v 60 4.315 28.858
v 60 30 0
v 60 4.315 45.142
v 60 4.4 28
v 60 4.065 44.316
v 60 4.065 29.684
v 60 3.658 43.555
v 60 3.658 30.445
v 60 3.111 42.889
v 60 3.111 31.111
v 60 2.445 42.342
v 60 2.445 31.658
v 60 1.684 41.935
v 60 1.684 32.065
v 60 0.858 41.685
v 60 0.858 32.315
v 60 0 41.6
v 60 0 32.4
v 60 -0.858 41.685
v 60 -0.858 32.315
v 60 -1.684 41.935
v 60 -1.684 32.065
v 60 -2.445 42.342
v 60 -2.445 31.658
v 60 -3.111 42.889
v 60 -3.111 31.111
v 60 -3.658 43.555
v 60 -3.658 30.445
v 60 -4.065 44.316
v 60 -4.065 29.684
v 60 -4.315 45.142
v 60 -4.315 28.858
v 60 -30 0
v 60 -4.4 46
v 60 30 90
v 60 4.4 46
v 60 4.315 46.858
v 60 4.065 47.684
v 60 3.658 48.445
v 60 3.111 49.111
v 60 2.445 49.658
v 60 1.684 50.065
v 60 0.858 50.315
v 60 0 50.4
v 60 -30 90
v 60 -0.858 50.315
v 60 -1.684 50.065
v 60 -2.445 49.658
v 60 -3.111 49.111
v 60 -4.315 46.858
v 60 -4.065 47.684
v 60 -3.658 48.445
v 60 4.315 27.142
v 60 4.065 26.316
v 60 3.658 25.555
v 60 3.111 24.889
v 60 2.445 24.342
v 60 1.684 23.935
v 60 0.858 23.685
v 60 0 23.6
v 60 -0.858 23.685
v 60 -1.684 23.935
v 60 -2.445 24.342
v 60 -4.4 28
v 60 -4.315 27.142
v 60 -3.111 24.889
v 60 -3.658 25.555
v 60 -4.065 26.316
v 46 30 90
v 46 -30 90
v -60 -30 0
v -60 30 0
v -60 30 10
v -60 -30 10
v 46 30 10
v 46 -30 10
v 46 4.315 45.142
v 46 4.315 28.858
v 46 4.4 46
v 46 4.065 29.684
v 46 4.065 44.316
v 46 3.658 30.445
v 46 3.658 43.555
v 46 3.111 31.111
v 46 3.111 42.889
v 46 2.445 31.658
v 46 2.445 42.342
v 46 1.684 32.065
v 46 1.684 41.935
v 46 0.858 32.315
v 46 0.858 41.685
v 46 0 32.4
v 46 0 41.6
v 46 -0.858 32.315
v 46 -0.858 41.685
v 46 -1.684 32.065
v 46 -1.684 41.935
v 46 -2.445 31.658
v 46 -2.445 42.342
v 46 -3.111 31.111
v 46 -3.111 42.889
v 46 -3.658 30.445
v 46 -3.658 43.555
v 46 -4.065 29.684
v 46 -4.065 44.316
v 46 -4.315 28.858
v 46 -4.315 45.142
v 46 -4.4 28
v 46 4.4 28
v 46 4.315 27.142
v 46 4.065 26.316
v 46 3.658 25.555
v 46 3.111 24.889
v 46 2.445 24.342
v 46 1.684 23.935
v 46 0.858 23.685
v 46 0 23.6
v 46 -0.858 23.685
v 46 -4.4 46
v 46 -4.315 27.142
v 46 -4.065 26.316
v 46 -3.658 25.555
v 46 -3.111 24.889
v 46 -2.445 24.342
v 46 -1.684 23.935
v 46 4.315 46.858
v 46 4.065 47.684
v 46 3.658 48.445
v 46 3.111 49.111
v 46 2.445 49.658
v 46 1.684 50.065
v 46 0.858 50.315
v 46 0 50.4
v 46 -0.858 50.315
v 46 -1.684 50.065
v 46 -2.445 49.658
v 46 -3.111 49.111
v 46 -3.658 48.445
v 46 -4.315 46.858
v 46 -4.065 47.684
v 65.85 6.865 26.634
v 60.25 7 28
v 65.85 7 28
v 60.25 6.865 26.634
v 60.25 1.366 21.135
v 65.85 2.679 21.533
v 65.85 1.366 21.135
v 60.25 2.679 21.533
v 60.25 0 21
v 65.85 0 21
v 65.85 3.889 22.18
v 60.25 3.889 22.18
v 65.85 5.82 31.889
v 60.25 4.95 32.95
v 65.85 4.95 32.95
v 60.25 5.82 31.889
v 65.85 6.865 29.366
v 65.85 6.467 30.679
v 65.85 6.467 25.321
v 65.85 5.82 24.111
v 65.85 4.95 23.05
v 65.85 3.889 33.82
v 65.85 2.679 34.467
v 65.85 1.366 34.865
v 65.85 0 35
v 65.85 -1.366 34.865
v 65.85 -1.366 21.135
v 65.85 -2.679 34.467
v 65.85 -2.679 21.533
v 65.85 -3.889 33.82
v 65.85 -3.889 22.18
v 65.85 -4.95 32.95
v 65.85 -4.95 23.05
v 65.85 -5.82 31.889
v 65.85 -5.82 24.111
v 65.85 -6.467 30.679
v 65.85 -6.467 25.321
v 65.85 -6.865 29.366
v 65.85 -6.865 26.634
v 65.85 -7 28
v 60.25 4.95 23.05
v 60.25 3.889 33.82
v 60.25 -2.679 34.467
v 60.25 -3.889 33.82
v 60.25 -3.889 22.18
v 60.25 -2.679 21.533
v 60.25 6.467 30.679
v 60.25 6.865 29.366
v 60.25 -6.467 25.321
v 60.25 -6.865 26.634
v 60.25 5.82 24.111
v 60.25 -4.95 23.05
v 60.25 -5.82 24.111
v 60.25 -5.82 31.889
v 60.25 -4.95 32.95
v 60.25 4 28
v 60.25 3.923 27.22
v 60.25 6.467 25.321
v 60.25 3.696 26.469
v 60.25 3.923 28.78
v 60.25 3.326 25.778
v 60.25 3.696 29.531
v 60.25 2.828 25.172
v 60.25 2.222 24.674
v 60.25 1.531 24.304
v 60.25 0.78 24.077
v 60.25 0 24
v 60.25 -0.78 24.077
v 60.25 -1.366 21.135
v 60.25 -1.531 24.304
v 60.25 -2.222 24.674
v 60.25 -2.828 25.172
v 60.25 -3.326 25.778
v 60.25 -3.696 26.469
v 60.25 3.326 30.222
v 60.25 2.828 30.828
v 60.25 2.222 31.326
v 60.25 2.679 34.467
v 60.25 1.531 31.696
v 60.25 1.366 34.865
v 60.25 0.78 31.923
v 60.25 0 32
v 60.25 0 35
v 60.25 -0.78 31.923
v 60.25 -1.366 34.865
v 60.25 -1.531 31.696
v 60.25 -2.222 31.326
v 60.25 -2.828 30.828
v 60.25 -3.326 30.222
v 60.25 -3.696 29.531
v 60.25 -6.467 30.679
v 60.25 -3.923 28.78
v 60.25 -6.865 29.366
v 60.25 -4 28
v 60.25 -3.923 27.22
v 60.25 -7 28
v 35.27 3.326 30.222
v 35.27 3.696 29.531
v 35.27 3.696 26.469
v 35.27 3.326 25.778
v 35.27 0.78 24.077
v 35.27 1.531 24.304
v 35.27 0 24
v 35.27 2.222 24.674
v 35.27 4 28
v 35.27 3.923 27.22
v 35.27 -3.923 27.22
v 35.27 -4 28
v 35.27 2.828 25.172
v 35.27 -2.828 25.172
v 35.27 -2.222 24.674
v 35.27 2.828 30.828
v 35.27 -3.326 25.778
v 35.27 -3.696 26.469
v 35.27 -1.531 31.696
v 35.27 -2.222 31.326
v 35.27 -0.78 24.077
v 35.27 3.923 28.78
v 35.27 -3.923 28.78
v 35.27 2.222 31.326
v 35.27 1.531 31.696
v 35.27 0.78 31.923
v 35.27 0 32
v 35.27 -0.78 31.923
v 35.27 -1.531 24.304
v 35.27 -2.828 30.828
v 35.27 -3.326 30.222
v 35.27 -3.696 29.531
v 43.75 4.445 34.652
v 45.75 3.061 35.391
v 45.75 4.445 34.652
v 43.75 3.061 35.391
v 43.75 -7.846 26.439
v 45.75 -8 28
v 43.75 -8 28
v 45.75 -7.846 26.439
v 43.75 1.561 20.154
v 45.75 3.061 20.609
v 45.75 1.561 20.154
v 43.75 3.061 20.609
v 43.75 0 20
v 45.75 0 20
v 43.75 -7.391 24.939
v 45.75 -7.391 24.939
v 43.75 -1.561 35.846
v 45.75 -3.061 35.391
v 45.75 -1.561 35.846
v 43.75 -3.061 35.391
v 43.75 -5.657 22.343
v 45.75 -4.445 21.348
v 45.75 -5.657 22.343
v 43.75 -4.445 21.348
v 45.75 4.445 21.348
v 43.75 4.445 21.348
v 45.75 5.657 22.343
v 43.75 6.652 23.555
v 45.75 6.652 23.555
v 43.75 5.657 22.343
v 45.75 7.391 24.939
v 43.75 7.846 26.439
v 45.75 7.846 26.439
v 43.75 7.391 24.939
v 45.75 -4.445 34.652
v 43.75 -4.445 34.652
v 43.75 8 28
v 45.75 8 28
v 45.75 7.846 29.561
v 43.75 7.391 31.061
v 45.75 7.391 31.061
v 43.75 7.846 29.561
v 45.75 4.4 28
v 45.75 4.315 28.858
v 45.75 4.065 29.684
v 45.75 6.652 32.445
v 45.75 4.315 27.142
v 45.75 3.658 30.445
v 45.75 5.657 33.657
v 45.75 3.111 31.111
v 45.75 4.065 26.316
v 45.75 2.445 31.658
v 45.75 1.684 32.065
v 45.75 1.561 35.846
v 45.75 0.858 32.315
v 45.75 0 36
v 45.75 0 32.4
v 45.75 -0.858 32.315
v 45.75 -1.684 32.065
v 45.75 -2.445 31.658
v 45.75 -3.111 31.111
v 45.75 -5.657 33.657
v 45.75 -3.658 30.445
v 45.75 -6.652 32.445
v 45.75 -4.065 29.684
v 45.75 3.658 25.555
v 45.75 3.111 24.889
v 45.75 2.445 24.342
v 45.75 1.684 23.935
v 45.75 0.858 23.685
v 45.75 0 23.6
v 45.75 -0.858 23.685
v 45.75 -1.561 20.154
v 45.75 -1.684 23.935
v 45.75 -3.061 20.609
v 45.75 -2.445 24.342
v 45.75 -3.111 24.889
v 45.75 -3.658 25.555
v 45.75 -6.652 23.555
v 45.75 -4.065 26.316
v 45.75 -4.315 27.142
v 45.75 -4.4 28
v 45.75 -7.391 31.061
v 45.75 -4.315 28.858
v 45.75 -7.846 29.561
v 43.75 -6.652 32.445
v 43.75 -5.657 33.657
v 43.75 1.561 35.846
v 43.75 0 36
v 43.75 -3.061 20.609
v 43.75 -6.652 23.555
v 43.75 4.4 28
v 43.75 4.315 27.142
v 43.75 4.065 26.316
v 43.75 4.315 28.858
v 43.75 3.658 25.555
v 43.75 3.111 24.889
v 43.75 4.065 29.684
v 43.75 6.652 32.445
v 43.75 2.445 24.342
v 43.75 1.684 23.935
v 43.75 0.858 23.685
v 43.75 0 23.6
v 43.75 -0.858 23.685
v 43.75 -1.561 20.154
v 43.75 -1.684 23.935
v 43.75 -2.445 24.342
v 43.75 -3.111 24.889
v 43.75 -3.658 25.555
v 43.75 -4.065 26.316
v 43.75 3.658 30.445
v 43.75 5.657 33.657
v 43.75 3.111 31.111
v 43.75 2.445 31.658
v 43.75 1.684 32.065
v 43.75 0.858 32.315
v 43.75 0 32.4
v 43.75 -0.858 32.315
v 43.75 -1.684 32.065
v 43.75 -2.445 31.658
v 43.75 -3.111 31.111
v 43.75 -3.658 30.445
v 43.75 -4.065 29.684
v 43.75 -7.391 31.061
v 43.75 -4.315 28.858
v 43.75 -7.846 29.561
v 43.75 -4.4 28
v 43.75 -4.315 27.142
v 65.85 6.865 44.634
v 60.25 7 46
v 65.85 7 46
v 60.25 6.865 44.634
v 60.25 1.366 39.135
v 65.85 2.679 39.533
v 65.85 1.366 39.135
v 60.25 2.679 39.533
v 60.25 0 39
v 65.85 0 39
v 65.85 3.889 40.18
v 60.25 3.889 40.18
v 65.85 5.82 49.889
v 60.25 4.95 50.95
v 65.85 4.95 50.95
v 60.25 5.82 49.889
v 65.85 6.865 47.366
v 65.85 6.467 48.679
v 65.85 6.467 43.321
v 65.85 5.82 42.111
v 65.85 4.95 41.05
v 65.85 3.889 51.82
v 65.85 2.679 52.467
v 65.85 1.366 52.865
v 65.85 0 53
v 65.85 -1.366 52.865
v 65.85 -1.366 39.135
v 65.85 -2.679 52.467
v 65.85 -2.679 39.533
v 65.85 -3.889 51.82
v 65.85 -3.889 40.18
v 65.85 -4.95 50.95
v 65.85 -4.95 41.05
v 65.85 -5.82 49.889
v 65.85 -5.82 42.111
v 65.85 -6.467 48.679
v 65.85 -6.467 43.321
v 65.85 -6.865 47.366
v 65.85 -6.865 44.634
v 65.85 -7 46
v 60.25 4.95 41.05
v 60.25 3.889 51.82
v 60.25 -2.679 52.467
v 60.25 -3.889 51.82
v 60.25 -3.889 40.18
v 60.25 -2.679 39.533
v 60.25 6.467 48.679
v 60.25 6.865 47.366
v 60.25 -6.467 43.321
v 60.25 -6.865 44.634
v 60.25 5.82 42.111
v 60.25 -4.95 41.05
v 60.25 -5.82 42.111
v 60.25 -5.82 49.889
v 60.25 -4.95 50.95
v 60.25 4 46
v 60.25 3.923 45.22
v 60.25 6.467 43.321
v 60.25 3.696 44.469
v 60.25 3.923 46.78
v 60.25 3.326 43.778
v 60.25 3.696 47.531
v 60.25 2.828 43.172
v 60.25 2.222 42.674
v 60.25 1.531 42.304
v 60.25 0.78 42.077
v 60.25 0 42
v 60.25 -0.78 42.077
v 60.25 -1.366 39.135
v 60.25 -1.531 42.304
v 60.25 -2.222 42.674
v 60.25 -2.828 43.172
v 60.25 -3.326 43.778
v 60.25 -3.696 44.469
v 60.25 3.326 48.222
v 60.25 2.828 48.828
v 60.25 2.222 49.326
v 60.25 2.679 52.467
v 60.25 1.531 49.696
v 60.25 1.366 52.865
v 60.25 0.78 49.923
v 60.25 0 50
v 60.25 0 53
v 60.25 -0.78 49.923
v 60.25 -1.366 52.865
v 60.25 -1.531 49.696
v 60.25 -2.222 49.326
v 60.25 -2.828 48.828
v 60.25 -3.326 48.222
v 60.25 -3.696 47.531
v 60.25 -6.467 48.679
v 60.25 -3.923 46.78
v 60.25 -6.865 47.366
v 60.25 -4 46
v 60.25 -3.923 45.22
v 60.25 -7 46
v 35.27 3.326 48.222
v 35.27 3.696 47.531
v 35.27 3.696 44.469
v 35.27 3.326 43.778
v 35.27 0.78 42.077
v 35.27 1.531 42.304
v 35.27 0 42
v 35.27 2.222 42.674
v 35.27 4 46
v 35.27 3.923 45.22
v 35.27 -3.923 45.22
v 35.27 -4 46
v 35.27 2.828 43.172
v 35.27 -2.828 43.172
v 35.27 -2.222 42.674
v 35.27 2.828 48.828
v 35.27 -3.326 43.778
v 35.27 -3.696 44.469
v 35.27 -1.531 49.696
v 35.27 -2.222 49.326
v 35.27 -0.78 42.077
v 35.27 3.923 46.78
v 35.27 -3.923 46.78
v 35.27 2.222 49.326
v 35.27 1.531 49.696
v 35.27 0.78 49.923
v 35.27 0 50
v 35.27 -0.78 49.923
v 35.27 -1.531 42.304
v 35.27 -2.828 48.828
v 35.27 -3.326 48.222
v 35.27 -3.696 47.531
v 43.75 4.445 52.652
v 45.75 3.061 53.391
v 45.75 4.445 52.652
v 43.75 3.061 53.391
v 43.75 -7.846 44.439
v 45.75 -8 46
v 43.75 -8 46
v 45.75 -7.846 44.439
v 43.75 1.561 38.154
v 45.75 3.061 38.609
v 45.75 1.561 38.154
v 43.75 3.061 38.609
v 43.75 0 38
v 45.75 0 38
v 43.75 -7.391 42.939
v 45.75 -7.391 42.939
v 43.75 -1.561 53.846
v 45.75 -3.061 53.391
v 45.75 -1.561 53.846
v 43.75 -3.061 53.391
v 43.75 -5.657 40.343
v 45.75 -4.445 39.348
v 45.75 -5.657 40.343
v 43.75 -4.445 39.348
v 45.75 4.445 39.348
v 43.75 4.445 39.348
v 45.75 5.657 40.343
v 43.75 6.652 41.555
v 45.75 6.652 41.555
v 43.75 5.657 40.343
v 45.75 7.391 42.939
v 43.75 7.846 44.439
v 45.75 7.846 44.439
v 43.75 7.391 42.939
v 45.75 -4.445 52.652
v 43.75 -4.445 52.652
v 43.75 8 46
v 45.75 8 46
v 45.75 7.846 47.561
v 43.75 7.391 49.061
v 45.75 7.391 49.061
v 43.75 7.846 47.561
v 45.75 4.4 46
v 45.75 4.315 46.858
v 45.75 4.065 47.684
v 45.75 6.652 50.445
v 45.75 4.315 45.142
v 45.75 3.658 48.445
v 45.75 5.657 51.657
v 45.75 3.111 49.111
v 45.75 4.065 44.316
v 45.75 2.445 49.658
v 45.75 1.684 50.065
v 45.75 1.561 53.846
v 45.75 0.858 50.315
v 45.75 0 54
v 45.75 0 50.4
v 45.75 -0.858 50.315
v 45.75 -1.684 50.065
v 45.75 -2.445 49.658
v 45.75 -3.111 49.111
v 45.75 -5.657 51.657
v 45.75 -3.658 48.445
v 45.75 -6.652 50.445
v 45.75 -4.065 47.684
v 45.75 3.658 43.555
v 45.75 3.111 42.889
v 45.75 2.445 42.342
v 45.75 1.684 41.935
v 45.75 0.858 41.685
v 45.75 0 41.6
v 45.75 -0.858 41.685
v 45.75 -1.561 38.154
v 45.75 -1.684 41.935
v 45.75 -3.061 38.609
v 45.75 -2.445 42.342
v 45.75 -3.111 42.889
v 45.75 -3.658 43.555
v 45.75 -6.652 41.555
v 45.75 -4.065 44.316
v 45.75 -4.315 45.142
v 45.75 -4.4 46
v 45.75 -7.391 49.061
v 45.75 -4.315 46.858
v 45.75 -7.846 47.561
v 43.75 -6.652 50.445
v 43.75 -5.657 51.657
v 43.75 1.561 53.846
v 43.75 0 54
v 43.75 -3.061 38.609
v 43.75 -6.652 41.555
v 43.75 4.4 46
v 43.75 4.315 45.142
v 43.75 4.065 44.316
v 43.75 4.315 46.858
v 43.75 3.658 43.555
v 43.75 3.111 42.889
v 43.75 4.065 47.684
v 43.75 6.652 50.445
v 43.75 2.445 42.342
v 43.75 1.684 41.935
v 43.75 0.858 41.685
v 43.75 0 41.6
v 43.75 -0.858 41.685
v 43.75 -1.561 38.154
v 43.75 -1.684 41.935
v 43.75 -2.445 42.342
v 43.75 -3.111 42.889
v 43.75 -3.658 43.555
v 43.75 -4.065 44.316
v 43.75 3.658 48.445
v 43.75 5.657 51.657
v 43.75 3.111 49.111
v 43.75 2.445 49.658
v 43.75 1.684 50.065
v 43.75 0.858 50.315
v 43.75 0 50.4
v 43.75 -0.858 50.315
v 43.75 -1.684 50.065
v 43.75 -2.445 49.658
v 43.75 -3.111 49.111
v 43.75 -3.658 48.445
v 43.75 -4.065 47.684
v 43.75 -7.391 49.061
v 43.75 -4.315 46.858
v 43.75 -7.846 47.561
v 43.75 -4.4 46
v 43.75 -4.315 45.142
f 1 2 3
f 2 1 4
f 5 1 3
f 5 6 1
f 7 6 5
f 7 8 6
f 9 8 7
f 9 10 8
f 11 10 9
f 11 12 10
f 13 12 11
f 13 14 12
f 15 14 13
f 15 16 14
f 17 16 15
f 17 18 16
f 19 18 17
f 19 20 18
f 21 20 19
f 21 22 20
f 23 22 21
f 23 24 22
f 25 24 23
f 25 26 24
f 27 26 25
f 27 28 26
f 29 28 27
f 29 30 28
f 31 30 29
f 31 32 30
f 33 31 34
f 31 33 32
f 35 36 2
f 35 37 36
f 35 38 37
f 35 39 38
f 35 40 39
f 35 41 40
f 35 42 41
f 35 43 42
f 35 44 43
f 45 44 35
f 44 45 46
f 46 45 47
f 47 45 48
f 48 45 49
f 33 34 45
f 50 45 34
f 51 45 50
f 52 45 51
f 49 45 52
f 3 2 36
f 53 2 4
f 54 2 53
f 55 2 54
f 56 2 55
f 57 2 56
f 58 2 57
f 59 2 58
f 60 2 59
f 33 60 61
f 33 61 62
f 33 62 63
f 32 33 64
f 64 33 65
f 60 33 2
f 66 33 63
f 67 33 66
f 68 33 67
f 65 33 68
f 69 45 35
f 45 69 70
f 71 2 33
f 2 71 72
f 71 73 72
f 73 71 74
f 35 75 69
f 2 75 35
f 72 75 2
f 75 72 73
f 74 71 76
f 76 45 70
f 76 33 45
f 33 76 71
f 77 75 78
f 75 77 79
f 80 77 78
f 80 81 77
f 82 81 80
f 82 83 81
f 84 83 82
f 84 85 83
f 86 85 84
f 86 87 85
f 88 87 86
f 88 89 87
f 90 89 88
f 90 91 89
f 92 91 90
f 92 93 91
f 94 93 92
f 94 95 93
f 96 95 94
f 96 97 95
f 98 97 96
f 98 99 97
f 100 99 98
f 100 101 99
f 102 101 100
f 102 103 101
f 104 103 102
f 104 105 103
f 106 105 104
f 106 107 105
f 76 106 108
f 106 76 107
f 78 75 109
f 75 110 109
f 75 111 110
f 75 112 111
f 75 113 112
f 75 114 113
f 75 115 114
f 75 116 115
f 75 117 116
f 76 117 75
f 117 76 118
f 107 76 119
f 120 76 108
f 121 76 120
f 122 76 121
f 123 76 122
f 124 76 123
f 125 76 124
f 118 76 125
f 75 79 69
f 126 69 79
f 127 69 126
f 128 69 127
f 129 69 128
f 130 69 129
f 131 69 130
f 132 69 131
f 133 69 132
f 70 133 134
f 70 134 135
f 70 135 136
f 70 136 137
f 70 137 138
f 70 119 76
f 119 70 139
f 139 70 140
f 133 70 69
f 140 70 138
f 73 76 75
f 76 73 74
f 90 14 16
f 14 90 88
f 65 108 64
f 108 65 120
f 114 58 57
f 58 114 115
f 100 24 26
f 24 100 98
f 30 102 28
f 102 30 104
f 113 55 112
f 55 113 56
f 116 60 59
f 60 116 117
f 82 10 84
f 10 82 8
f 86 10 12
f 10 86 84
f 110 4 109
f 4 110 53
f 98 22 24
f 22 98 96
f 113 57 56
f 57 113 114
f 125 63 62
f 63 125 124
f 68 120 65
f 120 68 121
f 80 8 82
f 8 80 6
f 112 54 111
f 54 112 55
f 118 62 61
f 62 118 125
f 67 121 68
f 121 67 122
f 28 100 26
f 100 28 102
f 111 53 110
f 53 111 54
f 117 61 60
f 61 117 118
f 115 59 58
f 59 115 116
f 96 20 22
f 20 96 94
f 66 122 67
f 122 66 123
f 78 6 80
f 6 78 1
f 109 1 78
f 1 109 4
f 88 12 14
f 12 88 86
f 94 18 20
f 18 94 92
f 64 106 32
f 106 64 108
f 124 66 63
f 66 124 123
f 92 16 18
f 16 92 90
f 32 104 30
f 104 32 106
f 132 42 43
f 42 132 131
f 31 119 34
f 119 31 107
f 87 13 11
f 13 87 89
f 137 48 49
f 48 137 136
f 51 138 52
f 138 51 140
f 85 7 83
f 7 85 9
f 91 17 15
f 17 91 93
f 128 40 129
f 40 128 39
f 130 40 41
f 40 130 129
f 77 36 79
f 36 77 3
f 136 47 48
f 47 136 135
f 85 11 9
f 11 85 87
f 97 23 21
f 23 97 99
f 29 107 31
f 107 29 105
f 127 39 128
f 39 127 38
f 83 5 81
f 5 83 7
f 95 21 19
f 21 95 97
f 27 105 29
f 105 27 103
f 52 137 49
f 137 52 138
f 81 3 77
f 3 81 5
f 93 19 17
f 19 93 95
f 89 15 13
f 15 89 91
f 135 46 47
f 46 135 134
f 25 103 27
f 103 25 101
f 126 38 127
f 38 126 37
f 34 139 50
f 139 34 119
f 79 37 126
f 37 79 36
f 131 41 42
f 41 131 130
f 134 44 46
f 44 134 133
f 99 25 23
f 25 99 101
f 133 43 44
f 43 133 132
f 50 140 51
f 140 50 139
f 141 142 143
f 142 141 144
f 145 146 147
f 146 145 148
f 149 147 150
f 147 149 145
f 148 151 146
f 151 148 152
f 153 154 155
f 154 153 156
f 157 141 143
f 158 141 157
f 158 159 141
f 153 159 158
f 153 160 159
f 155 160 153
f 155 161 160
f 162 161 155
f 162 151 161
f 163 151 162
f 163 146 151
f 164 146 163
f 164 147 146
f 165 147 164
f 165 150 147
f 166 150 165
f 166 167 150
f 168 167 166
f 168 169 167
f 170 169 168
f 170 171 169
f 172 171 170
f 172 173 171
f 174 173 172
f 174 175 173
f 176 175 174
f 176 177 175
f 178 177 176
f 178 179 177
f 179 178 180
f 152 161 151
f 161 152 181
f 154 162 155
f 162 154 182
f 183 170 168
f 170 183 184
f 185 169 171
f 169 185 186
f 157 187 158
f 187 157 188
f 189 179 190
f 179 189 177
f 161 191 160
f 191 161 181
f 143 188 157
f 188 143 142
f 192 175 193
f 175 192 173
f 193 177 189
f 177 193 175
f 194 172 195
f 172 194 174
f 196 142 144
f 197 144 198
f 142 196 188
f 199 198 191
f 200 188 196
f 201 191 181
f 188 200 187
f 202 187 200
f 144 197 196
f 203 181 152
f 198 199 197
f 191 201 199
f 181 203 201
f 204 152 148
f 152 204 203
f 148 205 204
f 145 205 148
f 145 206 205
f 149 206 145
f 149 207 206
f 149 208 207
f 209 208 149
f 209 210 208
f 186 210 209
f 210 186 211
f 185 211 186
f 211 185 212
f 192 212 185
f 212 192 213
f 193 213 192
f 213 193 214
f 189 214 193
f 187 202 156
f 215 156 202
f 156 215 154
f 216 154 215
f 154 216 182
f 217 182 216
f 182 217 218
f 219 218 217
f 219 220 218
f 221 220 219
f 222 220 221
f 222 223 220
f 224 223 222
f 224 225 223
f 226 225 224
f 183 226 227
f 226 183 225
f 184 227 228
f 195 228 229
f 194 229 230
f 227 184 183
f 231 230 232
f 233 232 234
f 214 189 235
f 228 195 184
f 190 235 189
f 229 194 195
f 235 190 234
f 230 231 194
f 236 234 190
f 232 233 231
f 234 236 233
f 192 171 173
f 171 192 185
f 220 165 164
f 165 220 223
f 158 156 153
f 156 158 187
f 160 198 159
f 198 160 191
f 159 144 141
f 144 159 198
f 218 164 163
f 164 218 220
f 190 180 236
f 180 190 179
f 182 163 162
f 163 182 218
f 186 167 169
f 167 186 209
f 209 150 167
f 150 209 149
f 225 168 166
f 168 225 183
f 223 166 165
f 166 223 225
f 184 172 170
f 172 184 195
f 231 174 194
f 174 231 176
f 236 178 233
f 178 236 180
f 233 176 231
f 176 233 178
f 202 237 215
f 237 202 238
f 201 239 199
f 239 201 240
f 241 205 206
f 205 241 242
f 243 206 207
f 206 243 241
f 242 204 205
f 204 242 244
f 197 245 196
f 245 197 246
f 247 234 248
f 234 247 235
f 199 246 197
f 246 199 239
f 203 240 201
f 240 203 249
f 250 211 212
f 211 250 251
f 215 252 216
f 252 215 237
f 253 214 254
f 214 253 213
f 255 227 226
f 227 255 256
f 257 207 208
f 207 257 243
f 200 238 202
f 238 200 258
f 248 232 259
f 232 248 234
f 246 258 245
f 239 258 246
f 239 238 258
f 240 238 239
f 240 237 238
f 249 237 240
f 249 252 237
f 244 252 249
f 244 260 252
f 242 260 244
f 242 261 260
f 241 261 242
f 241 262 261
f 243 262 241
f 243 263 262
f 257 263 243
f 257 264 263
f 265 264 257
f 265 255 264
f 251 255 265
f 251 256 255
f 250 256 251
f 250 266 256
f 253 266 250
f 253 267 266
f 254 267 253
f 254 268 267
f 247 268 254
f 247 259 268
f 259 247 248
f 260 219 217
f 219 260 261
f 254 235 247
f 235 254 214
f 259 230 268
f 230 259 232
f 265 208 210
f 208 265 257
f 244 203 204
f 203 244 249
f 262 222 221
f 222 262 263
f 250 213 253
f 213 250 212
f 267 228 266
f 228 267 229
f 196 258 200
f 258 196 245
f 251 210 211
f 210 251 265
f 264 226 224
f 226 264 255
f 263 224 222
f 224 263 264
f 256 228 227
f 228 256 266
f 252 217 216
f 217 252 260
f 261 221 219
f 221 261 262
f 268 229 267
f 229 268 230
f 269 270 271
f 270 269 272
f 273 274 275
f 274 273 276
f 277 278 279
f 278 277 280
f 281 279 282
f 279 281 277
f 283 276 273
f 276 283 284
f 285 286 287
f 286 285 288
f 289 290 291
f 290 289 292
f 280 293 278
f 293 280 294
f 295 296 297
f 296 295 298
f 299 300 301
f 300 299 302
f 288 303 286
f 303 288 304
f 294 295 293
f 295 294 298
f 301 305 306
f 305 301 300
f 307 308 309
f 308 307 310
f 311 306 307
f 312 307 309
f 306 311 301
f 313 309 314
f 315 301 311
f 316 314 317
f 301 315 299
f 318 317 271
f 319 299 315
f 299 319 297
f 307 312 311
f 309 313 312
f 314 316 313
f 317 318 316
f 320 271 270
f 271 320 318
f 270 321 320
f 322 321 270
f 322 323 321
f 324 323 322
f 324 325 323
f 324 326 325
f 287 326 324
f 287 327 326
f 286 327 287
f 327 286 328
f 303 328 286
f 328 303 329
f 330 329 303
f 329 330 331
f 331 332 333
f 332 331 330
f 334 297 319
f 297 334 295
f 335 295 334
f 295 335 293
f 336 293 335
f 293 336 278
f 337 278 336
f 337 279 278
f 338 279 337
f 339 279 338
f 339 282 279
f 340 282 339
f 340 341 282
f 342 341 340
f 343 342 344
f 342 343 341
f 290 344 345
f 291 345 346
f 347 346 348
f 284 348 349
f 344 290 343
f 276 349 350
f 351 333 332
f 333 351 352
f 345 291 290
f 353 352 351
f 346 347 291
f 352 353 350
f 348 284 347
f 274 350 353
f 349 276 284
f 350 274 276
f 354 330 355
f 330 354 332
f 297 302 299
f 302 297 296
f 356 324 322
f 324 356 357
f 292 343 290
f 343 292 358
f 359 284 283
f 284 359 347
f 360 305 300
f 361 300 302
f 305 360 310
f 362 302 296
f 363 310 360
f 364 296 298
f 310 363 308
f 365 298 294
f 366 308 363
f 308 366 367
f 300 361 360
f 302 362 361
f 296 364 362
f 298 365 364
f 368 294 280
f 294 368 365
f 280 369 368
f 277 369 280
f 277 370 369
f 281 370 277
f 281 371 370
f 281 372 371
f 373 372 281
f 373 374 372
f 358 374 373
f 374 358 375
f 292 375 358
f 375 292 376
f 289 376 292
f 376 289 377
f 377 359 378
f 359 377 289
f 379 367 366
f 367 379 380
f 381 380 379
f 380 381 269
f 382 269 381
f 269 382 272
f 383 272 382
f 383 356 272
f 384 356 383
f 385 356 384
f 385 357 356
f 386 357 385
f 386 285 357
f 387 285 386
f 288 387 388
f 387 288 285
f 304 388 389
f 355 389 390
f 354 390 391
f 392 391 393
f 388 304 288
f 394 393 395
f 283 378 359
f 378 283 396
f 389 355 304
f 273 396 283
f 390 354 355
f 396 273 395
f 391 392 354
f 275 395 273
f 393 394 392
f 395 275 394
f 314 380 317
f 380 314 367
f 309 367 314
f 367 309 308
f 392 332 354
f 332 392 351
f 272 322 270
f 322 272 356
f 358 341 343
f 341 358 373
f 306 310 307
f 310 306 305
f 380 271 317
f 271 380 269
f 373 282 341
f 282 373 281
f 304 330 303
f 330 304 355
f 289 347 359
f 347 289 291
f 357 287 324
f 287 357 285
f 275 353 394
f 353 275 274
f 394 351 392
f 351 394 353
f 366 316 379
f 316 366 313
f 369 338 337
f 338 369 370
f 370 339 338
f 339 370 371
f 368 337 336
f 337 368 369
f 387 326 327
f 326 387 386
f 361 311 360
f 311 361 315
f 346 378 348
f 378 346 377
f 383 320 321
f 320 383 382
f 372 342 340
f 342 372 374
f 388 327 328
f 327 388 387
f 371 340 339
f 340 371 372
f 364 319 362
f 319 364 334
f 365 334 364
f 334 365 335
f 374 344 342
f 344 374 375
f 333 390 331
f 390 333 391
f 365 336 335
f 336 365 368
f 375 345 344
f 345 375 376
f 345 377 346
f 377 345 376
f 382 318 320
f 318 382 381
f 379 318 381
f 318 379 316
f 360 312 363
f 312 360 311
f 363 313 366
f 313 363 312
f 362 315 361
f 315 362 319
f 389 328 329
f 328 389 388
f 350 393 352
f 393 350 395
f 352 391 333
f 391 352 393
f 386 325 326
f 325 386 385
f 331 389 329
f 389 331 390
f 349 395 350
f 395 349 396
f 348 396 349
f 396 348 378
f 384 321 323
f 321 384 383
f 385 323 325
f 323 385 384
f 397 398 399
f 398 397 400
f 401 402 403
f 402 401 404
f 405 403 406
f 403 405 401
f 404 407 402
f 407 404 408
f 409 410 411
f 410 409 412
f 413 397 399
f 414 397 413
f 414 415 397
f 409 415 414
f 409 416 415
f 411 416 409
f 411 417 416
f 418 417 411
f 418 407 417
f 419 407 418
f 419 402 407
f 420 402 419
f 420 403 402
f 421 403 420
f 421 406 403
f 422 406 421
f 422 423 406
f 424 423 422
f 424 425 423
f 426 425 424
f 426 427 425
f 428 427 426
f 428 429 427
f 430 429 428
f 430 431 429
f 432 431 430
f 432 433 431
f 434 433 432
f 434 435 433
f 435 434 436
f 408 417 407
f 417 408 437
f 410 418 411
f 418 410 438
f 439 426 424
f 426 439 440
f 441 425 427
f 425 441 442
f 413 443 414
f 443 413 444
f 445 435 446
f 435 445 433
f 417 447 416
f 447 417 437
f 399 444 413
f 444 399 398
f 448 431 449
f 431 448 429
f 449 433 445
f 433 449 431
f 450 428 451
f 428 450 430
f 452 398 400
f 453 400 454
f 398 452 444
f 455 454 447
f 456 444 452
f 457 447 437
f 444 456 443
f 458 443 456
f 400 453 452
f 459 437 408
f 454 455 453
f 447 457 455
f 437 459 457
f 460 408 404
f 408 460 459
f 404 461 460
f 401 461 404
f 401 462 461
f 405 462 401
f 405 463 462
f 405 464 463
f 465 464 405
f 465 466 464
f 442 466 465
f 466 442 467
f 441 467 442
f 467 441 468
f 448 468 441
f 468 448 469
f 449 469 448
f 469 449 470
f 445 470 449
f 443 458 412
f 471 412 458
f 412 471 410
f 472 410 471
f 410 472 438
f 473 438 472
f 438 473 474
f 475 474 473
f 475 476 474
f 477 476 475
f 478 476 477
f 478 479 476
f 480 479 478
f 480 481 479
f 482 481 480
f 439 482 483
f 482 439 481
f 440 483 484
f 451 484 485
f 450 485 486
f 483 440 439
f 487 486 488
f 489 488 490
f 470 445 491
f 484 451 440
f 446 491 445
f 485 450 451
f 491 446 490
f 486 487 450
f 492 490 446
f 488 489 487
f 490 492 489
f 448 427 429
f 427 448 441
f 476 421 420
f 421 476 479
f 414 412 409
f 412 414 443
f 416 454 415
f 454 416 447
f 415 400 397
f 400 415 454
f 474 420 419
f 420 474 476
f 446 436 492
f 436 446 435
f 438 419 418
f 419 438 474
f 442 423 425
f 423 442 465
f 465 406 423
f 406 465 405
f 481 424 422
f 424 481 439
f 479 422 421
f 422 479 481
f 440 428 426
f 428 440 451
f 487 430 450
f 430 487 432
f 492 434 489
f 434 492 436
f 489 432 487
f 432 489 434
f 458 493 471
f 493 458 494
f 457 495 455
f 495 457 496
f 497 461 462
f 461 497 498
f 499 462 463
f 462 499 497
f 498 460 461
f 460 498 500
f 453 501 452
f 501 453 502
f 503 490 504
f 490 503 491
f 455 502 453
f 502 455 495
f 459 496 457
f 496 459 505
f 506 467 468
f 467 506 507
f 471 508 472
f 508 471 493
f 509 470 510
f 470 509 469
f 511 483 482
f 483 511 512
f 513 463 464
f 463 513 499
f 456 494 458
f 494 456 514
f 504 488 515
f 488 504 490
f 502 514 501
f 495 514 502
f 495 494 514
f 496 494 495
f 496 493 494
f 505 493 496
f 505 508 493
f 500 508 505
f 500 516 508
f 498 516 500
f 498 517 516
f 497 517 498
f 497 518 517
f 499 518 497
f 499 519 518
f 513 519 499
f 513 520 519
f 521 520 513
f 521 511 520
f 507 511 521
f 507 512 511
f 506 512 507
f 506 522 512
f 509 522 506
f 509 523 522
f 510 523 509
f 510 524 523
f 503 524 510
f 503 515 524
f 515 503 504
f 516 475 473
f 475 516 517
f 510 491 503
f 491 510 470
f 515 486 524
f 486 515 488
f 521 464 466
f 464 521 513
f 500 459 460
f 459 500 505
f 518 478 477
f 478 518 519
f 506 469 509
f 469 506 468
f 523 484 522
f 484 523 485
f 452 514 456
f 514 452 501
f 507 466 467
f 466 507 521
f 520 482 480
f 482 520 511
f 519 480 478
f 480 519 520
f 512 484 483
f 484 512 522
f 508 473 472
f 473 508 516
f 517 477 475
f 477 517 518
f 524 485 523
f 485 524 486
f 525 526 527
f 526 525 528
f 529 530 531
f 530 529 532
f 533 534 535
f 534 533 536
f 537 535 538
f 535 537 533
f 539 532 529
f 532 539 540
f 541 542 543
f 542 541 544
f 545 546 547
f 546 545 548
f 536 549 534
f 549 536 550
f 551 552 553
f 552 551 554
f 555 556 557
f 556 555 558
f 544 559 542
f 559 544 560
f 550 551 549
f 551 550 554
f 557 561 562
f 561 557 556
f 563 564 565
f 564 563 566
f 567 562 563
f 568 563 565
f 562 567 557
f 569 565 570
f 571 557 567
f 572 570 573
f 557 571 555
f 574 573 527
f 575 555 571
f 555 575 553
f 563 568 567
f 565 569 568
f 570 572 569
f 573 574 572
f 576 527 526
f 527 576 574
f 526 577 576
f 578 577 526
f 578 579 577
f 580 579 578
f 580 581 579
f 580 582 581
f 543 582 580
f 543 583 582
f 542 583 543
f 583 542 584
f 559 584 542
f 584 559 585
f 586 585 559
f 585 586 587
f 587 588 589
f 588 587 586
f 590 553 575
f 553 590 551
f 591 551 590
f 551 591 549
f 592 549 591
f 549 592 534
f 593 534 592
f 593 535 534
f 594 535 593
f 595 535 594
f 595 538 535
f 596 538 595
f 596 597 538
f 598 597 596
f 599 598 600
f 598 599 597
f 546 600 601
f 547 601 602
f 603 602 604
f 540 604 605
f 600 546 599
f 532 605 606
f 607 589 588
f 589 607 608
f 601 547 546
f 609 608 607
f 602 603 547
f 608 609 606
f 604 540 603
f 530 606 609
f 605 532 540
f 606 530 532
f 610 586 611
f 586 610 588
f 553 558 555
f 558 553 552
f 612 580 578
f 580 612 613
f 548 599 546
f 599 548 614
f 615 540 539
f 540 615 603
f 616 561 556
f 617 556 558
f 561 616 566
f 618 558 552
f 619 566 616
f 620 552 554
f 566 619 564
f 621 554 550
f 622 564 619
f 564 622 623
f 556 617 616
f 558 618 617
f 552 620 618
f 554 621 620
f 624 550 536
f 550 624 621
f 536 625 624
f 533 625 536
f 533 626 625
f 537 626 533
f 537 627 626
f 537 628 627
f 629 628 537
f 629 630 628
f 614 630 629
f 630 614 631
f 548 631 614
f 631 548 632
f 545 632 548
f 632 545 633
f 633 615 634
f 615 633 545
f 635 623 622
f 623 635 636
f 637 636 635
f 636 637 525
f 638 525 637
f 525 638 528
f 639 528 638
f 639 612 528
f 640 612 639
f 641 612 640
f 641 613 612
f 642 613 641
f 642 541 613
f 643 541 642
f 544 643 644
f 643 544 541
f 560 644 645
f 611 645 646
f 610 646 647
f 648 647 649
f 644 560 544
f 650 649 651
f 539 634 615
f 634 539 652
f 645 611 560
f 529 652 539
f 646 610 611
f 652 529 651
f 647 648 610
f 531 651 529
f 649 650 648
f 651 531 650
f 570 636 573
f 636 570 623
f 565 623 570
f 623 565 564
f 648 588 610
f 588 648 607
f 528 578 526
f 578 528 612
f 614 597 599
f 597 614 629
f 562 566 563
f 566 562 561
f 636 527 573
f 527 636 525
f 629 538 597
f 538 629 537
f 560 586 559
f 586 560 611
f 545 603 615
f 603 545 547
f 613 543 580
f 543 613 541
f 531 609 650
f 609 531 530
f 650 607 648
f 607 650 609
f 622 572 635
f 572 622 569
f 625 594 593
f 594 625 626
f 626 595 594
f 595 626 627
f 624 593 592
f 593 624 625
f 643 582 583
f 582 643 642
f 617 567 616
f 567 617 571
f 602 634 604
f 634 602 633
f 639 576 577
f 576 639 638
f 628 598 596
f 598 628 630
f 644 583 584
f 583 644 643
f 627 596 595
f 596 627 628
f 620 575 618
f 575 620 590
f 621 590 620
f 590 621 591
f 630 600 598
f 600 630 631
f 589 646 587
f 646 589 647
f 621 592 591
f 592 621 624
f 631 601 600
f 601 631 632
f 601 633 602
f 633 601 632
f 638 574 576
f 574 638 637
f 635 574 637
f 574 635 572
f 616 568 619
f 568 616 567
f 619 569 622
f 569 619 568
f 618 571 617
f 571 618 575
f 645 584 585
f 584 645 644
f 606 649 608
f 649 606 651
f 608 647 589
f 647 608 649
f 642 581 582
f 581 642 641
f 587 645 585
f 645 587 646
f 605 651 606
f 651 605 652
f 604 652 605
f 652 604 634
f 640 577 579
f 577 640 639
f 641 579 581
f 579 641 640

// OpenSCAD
$fn = 32;

// ------------------------------------------------------------------------
// Bolted bracket: 120 x 60 mm bracket with 2 bolt joints
// Every part is its own module, assembly() places them once.
// ------------------------------------------------------------------------

// --- part 1 ---
module bracket() {
  difference() {
    translate([-60, -30, 0]) cube([120, 60, 90]);
    translate([-61, -31, 10]) cube([107, 62, 81]);
    translate([53, 0, 28]) rotate([0, 90, 0]) cylinder(h = 16, d = 8.8, center = true);
    translate([53, 0, 46]) rotate([0, 90, 0]) cylinder(h = 16, d = 8.8, center = true);
  }
}

// --- part 2 ---
module bolt1() {
  cylinder(h = 5.6, d = 14);
  translate([0, 0, -24.98]) cylinder(h = 24.98, d = 8);
}

// --- part 3 ---
module washer1() {
  difference() {
      translate([0, 0, 0]) cylinder(h = 2, d = 16);
      translate([0, 0, -1]) cylinder(h = 4, d = 8.8);
    }
}

// --- part 4 ---
module bolt2() {
  cylinder(h = 5.6, d = 14);
  translate([0, 0, -24.98]) cylinder(h = 24.98, d = 8);
}

// --- part 5 ---
module washer2() {
  difference() {
      translate([0, 0, 0]) cylinder(h = 2, d = 16);
      translate([0, 0, -1]) cylinder(h = 4, d = 8.8);
    }
}

// --- assembly ---
module assembly() {
  translate([0, 0, 0]) rotate([0, 0, 0]) bracket();
  translate([60.25, 0, 28]) rotate([0, 90, 0]) bolt1();
  translate([43.75, 0, 28]) rotate([0, 90, 0]) washer1();
  translate([60.25, 0, 46]) rotate([0, 90, 0]) bolt2();
  translate([43.75, 0, 46]) rotate([0, 90, 0]) washer2();
}

assembly();
